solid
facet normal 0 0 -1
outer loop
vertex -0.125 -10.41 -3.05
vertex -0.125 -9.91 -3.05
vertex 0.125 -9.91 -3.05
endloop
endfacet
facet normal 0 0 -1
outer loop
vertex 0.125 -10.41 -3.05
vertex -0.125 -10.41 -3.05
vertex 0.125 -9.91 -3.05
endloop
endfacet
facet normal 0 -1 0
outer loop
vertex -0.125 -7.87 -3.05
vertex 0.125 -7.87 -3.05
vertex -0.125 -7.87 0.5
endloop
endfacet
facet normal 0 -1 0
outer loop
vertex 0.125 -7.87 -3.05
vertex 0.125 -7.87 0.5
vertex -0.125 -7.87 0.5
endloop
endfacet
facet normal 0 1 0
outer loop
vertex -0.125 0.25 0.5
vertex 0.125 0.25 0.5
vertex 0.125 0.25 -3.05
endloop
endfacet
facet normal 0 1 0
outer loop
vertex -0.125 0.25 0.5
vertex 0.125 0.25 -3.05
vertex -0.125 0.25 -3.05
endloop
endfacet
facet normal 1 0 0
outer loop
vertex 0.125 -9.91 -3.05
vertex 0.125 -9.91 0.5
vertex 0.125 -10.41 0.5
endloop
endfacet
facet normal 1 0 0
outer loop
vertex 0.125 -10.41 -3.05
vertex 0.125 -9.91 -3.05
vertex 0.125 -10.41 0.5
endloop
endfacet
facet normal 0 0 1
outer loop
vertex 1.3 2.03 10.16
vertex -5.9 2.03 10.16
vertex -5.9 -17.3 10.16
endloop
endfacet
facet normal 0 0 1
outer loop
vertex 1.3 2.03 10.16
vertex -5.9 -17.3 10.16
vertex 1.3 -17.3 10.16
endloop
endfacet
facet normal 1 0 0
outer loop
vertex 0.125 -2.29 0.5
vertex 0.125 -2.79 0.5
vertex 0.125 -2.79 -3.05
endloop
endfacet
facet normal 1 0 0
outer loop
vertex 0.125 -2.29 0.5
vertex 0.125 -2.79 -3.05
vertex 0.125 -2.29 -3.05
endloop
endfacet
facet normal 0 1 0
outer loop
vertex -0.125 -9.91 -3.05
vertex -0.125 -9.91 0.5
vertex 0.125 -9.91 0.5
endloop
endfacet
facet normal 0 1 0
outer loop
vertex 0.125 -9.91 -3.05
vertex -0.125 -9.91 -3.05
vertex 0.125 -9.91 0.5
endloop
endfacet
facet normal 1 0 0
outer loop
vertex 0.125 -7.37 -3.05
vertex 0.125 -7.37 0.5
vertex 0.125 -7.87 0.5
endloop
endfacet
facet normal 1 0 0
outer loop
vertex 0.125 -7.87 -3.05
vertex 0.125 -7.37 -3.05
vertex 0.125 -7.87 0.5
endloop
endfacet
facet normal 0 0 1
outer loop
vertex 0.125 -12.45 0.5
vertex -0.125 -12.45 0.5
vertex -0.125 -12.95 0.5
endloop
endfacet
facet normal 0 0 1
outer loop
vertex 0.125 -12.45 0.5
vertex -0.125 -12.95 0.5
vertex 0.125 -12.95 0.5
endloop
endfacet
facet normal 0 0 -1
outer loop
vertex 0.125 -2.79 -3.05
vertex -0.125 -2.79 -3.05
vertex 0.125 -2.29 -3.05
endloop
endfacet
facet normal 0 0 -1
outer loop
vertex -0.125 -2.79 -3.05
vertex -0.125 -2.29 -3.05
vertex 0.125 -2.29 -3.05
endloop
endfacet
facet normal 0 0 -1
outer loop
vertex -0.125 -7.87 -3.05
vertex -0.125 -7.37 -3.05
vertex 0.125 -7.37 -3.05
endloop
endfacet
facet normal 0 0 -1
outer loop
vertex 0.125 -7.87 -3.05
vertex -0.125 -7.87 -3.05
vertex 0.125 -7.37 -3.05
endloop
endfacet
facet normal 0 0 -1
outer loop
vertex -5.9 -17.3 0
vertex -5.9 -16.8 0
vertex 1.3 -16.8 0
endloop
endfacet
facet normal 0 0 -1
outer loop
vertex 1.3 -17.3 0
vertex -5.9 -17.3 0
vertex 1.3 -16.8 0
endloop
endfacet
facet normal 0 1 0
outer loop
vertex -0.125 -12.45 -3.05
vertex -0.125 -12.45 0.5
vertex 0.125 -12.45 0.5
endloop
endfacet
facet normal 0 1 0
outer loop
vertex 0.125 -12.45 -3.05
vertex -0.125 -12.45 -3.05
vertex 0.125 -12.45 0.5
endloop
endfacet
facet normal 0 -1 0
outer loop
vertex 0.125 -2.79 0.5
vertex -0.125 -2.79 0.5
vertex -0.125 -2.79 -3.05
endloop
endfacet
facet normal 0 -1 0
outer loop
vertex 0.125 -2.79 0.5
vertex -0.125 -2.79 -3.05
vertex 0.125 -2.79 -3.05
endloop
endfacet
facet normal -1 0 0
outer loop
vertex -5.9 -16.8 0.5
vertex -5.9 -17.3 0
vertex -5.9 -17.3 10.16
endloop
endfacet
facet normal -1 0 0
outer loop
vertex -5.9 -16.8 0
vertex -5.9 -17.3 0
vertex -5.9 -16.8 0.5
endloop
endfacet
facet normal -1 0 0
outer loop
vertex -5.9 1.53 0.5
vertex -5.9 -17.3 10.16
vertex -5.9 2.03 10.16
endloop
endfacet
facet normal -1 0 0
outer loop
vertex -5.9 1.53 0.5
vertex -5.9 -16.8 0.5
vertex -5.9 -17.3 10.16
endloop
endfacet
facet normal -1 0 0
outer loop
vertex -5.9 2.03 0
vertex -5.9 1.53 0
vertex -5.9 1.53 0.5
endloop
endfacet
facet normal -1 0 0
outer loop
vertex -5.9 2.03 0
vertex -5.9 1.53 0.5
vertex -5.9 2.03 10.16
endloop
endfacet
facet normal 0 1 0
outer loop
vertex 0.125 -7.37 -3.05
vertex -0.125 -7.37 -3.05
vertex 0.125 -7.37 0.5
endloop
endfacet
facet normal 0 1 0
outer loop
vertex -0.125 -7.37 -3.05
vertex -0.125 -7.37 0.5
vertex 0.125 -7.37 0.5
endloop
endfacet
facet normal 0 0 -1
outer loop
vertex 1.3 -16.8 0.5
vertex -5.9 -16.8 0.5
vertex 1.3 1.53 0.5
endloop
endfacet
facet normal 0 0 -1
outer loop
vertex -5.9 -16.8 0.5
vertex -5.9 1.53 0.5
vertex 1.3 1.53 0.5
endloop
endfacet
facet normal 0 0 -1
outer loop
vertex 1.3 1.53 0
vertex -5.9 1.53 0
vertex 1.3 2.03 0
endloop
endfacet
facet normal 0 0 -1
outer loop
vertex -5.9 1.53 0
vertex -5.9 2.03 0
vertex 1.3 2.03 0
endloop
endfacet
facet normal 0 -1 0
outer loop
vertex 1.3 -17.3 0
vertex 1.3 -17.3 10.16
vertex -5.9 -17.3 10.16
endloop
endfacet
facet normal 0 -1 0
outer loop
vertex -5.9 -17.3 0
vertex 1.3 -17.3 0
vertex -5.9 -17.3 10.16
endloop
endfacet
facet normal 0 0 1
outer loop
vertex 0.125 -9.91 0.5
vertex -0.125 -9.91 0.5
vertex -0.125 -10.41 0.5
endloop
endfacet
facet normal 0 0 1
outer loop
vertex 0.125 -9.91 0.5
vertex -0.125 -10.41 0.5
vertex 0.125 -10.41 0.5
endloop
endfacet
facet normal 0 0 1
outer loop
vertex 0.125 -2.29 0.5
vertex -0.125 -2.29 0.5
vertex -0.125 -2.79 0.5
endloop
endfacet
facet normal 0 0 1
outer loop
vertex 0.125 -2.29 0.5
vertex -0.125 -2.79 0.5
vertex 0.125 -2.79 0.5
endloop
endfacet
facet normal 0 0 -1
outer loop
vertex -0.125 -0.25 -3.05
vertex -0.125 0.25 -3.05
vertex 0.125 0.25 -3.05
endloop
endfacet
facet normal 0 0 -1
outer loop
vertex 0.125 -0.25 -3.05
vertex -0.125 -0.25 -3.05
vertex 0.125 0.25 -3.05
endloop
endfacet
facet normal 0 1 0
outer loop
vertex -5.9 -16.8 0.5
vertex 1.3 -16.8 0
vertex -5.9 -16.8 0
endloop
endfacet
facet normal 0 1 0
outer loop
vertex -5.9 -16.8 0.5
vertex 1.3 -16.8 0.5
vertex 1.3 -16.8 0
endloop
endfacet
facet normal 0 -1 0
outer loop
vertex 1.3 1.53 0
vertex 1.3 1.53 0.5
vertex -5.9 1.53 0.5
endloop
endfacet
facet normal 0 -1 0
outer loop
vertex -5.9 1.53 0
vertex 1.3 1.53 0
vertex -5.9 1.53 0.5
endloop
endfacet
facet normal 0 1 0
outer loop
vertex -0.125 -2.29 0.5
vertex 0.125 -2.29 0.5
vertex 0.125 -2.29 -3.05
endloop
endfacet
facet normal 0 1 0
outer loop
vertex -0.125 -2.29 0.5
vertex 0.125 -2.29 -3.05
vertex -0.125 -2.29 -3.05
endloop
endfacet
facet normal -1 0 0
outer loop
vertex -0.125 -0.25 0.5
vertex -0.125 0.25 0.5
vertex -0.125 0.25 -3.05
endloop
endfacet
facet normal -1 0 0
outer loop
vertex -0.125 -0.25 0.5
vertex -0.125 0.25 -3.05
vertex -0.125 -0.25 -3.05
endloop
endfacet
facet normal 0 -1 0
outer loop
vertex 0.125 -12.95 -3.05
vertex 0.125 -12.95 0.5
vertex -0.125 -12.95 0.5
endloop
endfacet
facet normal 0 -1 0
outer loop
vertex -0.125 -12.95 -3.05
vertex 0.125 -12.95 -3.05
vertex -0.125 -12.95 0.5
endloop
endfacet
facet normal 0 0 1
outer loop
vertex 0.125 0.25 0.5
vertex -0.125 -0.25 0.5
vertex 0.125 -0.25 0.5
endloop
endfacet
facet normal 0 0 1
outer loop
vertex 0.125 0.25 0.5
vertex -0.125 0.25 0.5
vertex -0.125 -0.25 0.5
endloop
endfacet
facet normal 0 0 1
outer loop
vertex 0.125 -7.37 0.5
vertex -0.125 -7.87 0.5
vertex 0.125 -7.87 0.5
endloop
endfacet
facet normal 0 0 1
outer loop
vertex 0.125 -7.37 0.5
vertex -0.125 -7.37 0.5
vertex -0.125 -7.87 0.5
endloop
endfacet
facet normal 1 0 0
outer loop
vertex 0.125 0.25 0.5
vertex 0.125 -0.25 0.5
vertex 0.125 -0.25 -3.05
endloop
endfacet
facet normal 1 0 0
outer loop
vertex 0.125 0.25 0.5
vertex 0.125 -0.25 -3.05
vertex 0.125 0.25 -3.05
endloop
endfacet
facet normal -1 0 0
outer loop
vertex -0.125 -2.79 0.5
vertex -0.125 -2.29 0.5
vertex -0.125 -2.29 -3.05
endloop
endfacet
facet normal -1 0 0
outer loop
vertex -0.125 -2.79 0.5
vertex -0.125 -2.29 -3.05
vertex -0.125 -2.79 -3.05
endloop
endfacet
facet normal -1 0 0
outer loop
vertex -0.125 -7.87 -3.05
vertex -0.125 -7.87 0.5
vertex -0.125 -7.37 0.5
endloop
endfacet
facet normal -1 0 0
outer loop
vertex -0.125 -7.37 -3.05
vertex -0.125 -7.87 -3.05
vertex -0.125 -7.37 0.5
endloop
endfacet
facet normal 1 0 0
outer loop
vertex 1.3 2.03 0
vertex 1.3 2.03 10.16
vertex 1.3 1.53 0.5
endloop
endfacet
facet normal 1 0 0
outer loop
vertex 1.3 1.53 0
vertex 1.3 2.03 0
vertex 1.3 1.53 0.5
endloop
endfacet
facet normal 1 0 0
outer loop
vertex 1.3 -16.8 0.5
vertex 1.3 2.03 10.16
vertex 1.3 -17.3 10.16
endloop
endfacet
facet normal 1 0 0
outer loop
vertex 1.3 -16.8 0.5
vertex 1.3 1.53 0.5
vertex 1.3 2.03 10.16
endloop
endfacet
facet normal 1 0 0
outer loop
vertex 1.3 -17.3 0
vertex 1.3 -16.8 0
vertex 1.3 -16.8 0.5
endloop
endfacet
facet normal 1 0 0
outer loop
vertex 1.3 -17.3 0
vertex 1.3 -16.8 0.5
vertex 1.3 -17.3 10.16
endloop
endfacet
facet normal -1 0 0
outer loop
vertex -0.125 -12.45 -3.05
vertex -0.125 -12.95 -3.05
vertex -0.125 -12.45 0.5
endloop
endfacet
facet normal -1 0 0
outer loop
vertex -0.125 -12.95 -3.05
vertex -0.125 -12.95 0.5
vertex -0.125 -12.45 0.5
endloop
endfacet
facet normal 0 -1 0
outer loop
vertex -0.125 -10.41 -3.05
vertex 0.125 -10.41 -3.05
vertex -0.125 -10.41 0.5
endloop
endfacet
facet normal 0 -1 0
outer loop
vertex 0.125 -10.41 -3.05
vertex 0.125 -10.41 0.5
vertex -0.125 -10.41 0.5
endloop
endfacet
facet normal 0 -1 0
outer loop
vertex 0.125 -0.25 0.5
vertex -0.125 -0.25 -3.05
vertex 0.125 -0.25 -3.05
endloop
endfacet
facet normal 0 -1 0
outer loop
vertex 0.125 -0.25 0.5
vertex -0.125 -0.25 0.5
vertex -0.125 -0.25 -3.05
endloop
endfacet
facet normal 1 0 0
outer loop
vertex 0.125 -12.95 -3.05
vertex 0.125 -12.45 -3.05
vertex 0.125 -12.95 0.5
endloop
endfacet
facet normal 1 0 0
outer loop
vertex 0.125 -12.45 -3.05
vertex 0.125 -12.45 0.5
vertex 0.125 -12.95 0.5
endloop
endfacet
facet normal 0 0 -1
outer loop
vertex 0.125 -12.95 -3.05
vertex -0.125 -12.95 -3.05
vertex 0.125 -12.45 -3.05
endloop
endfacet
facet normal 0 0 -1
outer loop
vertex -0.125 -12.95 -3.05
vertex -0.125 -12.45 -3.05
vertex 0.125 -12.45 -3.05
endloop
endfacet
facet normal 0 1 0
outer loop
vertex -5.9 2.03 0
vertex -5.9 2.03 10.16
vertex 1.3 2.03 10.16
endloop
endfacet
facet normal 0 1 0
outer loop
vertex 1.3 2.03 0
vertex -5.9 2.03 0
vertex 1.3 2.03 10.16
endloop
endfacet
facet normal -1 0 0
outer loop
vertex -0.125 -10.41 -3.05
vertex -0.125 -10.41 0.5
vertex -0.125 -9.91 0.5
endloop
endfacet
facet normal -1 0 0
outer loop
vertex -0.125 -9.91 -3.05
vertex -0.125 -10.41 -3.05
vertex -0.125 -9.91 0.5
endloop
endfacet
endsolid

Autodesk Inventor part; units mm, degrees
ref_plane "YZ Plane" through (0, 0, 0) normal (1, 0, 0) x (0, 1, 0)
ref_plane "XZ Plane" through (0, 0, 0) normal (0, 1, 0) x (-1, 0, 0)
ref_plane "XY Plane" through (0, 0, 0) normal (0, 0, 1) x (1, 0, 0)
sketch "Sketch2" plane through (0, 0, 0) normal (0, 0, 1) x (1, 0, 0)
  line L0 (-5.9, 2.03) -> (1.3, 2.03)
  line L1 (1.3, 2.03) -> (1.3, -17.3)
  line L2 (1.3, -17.3) -> (-5.9, -17.3)
  line L3 (-5.9, -17.3) -> (-5.9, 2.03)
  line L4 (-0.125, -0.25) -> (0.125, -0.25)
  line L5 (0.125, -0.25) -> (0.125, 0.25)
  line L6 (0.125, 0.25) -> (-0.125, 0.25)
  line L7 (-0.125, 0.25) -> (-0.125, -0.25)
  line L8 (-0.125, -0.25) -> (0.125, 0.25) construction
  line L9 (0.125, -0.25) -> (-0.125, 0.25) construction
  line L10 (-0.125, -2.79) -> (0.125, -2.79)
  line L11 (0.125, -2.79) -> (0.125, -2.29)
  line L12 (0.125, -2.29) -> (-0.125, -2.29)
  line L13 (-0.125, -2.29) -> (-0.125, -2.79)
  line L14 (-0.125, -2.79) -> (0.125, -2.29) construction
  line L15 (0.125, -2.79) -> (-0.125, -2.29) construction
  line L16 (-0.125, -7.37) -> (0.125, -7.37)
  line L17 (0.125, -7.37) -> (0.125, -7.87)
  line L18 (0.125, -7.87) -> (-0.125, -7.87)
  line L19 (-0.125, -7.87) -> (-0.125, -7.37)
  line L20 (-0.125, -7.37) -> (0.125, -7.87) construction
  line L21 (0.125, -7.37) -> (-0.125, -7.87) construction
  line L22 (-0.125, -9.91) -> (0.125, -9.91)
  line L23 (0.125, -9.91) -> (0.125, -10.41)
  line L24 (-0.125, -10.41) -> (-0.125, -9.91)
  line L25 (-0.125, -9.91) -> (0.125, -10.41) construction
  line L26 (0.125, -9.91) -> (-0.125, -10.41) construction
  line L27 (0.125, -10.41) -> (-0.125, -10.41)
  line L28 (-0.125, -12.45) -> (0.125, -12.45)
  line L29 (0.125, -12.45) -> (0.125, -12.95)
  line L30 (-0.125, -12.95) -> (-0.125, -12.45)
  line L31 (-0.125, -12.45) -> (0.125, -12.95) construction
  line L32 (0.125, -12.45) -> (-0.125, -12.95) construction
  line L33 (0.125, -12.95) -> (-0.125, -12.95)
  line L34 (-5.9, 2.03) -> (1.3, 2.03)
  line L35 (1.3, 2.03) -> (1.3, 1.53)
  line L36 (1.3, 1.53) -> (-5.9, 1.53)
  line L37 (-5.9, 1.53) -> (-5.9, 2.03)
  line L38 (-5.9, -17.3) -> (1.3, -17.3)
  line L39 (1.3, -17.3) -> (1.3, -16.8)
  line L40 (1.3, -16.8) -> (-5.9, -16.8)
  line L41 (-5.9, -16.8) -> (-5.9, -17.3)
  point P0 (0, 0)
  point P1 (0, -2.54)
  point P2 (0, -7.62)
  point P3 (0, -10.16)
  point P4 (0, -12.7)
  dimension "d37" = 2.03
  dimension "d38" = 1.3
  dimension "d39" = 17.3
  dimension "d40" = 7.2
  dimension "d41" = 0.25
  dimension "d42" = 0.5
  dimension "d45" = 2.54
  dimension "d50" = 0.25
  dimension "d51" = 0.5
  dimension "d52" = 0
  dimension "d53" = 7.62
  dimension "d56" = 2.54
  dimension "d61" = 0.5
  dimension "d62" = 0.5
extrude "Extrusion4" add sketch "Sketch2" along normal blind 9.66 contours L0 L1 L36 L3 | L36 L1 L40 L3 | L40 L1 L2 L3 | L7 L6 L5 L4 | L13 L12 L11 L10 | L16 L17 L18 L19 | L22 L23 L27 L24 | L28 L29 L33 L30
extrude "Extrusion5" add sketch "Sketch2" against normal blind 0.5 contours L0 L1 L36 L3 | L40 L1 L2 L3
extrude "Extrusion6" add sketch "Sketch2" against normal blind 3.55 separate body contours L7 L6 L5 L4 | L13 L12 L11 L10 | L16 L17 L18 L19 | L22 L23 L27 L24 | L28 L29 L33 L30
move or copy body "Move Body1" bodies to move or copy 1 2 copy no translate (0, 0, 0.5)
equation "\"d50\" = d41"
equation "\"d51\" = d42"
properties part number "Converter_DCDC_XP_POWER-IA48xx_SIP_THT"
